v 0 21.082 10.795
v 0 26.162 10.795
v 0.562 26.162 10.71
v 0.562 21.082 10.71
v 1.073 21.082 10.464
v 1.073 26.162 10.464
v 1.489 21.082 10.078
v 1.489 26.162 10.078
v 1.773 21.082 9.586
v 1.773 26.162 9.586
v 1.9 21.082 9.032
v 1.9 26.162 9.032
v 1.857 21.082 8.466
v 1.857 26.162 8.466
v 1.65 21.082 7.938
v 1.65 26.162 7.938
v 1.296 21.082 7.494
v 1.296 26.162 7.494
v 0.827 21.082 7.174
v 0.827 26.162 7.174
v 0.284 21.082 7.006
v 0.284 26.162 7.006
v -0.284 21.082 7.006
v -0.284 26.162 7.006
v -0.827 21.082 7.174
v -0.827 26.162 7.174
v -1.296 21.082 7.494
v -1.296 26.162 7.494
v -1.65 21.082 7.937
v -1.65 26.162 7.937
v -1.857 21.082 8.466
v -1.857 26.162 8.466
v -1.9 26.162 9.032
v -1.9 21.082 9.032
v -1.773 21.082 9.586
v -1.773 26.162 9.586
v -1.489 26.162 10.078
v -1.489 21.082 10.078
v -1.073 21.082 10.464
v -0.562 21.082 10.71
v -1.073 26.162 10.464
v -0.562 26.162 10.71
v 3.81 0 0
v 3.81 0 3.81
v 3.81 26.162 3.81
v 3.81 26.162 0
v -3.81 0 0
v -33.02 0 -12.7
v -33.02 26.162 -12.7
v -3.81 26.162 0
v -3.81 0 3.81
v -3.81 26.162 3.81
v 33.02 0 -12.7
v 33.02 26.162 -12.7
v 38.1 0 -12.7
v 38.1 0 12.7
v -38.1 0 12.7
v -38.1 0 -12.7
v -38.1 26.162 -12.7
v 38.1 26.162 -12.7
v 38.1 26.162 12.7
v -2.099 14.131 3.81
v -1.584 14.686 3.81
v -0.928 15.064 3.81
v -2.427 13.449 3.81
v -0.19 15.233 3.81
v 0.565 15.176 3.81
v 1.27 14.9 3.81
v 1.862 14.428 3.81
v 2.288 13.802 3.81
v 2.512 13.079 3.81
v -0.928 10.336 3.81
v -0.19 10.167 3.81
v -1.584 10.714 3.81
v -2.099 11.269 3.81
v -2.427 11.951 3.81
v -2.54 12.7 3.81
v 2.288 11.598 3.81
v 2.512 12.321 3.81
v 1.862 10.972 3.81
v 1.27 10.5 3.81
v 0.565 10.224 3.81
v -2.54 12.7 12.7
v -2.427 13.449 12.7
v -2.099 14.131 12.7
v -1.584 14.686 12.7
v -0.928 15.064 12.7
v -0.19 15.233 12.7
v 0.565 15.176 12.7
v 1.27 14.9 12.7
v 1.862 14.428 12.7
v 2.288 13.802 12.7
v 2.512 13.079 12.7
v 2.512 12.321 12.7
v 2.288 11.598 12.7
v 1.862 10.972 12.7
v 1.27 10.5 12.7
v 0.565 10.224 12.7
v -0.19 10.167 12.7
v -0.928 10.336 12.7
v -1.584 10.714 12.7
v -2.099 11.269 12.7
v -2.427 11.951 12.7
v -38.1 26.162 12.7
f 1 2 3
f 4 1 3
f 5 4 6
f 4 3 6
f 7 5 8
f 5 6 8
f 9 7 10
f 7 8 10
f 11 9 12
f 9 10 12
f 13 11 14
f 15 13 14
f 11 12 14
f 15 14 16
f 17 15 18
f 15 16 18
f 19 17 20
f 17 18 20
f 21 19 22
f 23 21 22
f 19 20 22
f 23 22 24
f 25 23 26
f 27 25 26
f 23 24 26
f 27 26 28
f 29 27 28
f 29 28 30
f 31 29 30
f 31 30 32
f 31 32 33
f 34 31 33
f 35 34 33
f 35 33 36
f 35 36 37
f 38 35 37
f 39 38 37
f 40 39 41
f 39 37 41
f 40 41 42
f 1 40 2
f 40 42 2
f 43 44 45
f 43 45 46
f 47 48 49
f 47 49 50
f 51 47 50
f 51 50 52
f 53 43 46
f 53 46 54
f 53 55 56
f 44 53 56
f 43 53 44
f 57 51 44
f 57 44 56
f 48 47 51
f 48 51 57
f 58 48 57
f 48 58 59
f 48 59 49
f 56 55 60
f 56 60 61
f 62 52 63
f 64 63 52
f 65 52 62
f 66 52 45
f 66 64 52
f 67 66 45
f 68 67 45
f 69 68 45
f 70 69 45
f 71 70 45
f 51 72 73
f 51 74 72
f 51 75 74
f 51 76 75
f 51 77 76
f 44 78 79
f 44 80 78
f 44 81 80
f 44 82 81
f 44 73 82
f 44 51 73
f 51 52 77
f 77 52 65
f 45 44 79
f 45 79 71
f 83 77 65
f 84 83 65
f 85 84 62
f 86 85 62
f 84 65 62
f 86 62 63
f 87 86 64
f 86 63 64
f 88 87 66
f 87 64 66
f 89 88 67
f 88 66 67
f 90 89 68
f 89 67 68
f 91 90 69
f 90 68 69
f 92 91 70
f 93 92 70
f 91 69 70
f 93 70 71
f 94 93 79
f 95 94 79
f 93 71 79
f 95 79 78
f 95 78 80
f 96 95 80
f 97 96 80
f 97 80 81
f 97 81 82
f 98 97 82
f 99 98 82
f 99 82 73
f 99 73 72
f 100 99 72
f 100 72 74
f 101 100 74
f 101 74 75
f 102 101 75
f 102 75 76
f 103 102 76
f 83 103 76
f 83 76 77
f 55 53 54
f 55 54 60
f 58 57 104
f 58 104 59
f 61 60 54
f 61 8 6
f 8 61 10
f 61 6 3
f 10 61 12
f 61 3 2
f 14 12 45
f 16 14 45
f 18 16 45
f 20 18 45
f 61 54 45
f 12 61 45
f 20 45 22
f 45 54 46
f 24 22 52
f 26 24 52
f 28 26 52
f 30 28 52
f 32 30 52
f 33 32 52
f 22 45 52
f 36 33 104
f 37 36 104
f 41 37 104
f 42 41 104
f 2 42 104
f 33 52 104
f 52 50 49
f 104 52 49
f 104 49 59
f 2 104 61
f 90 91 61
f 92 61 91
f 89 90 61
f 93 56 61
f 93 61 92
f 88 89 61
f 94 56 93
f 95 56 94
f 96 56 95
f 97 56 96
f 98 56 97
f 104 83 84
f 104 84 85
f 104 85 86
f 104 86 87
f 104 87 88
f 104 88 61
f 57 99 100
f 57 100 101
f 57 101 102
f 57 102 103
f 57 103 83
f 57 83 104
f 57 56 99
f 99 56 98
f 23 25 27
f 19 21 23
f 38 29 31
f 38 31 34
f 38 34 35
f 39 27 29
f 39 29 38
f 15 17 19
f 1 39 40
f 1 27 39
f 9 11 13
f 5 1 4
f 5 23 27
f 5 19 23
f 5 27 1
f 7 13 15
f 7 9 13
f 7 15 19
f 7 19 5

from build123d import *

# Parameters (mm, degrees)
BOSS_EXTRUDE1_DEPTH = 26.162
SKETCH3_R           = 1.905
CUT_EXTRUDE2_DEPTH  = 5.08
SKETCH2_R           = 2.54
CUT_EXTRUDE3_DEPTH  = 50.07790077


with BuildPart() as part:
    # Sketch1 → Boss-Extrude1 (new body)
    with BuildSketch(Plane(origin=(0, 0, 0), x_dir=(1, 0, 0), z_dir=(0, 1, 0))):
        Polygon((38.1, -12.7), (-38.1, -12.7), (-38.1, 12.7), (-33.02, 12.7), (-3.81, 0), (-3.81, -3.81), (3.81, -3.81), (3.81, 0), (33.02, 12.7), (38.1, 12.7), align=None)
    extrude(amount=BOSS_EXTRUDE1_DEPTH)

    # Sketch3 → Cut-Extrude2 (cut)
    with BuildSketch(Plane(origin=(0, 26.162, 0), x_dir=(1, 0, 0), z_dir=(0, 1, 0))):
        with Locations(Location((0, -8.89, 0), (0, 0, 270))):
            Circle(SKETCH3_R)
    extrude(amount=-CUT_EXTRUDE2_DEPTH, mode=Mode.SUBTRACT)

    # Sketch2 → Cut-Extrude3 (cut, through all)
    with BuildSketch(Plane(origin=(0, 0, 3.81), x_dir=(-1, 0, 0), z_dir=(0, 0, -1))):
        with Locations((0, 12.7)):
            Circle(SKETCH2_R)
    extrude(amount=-CUT_EXTRUDE3_DEPTH, mode=Mode.SUBTRACT)


solid = part.part
